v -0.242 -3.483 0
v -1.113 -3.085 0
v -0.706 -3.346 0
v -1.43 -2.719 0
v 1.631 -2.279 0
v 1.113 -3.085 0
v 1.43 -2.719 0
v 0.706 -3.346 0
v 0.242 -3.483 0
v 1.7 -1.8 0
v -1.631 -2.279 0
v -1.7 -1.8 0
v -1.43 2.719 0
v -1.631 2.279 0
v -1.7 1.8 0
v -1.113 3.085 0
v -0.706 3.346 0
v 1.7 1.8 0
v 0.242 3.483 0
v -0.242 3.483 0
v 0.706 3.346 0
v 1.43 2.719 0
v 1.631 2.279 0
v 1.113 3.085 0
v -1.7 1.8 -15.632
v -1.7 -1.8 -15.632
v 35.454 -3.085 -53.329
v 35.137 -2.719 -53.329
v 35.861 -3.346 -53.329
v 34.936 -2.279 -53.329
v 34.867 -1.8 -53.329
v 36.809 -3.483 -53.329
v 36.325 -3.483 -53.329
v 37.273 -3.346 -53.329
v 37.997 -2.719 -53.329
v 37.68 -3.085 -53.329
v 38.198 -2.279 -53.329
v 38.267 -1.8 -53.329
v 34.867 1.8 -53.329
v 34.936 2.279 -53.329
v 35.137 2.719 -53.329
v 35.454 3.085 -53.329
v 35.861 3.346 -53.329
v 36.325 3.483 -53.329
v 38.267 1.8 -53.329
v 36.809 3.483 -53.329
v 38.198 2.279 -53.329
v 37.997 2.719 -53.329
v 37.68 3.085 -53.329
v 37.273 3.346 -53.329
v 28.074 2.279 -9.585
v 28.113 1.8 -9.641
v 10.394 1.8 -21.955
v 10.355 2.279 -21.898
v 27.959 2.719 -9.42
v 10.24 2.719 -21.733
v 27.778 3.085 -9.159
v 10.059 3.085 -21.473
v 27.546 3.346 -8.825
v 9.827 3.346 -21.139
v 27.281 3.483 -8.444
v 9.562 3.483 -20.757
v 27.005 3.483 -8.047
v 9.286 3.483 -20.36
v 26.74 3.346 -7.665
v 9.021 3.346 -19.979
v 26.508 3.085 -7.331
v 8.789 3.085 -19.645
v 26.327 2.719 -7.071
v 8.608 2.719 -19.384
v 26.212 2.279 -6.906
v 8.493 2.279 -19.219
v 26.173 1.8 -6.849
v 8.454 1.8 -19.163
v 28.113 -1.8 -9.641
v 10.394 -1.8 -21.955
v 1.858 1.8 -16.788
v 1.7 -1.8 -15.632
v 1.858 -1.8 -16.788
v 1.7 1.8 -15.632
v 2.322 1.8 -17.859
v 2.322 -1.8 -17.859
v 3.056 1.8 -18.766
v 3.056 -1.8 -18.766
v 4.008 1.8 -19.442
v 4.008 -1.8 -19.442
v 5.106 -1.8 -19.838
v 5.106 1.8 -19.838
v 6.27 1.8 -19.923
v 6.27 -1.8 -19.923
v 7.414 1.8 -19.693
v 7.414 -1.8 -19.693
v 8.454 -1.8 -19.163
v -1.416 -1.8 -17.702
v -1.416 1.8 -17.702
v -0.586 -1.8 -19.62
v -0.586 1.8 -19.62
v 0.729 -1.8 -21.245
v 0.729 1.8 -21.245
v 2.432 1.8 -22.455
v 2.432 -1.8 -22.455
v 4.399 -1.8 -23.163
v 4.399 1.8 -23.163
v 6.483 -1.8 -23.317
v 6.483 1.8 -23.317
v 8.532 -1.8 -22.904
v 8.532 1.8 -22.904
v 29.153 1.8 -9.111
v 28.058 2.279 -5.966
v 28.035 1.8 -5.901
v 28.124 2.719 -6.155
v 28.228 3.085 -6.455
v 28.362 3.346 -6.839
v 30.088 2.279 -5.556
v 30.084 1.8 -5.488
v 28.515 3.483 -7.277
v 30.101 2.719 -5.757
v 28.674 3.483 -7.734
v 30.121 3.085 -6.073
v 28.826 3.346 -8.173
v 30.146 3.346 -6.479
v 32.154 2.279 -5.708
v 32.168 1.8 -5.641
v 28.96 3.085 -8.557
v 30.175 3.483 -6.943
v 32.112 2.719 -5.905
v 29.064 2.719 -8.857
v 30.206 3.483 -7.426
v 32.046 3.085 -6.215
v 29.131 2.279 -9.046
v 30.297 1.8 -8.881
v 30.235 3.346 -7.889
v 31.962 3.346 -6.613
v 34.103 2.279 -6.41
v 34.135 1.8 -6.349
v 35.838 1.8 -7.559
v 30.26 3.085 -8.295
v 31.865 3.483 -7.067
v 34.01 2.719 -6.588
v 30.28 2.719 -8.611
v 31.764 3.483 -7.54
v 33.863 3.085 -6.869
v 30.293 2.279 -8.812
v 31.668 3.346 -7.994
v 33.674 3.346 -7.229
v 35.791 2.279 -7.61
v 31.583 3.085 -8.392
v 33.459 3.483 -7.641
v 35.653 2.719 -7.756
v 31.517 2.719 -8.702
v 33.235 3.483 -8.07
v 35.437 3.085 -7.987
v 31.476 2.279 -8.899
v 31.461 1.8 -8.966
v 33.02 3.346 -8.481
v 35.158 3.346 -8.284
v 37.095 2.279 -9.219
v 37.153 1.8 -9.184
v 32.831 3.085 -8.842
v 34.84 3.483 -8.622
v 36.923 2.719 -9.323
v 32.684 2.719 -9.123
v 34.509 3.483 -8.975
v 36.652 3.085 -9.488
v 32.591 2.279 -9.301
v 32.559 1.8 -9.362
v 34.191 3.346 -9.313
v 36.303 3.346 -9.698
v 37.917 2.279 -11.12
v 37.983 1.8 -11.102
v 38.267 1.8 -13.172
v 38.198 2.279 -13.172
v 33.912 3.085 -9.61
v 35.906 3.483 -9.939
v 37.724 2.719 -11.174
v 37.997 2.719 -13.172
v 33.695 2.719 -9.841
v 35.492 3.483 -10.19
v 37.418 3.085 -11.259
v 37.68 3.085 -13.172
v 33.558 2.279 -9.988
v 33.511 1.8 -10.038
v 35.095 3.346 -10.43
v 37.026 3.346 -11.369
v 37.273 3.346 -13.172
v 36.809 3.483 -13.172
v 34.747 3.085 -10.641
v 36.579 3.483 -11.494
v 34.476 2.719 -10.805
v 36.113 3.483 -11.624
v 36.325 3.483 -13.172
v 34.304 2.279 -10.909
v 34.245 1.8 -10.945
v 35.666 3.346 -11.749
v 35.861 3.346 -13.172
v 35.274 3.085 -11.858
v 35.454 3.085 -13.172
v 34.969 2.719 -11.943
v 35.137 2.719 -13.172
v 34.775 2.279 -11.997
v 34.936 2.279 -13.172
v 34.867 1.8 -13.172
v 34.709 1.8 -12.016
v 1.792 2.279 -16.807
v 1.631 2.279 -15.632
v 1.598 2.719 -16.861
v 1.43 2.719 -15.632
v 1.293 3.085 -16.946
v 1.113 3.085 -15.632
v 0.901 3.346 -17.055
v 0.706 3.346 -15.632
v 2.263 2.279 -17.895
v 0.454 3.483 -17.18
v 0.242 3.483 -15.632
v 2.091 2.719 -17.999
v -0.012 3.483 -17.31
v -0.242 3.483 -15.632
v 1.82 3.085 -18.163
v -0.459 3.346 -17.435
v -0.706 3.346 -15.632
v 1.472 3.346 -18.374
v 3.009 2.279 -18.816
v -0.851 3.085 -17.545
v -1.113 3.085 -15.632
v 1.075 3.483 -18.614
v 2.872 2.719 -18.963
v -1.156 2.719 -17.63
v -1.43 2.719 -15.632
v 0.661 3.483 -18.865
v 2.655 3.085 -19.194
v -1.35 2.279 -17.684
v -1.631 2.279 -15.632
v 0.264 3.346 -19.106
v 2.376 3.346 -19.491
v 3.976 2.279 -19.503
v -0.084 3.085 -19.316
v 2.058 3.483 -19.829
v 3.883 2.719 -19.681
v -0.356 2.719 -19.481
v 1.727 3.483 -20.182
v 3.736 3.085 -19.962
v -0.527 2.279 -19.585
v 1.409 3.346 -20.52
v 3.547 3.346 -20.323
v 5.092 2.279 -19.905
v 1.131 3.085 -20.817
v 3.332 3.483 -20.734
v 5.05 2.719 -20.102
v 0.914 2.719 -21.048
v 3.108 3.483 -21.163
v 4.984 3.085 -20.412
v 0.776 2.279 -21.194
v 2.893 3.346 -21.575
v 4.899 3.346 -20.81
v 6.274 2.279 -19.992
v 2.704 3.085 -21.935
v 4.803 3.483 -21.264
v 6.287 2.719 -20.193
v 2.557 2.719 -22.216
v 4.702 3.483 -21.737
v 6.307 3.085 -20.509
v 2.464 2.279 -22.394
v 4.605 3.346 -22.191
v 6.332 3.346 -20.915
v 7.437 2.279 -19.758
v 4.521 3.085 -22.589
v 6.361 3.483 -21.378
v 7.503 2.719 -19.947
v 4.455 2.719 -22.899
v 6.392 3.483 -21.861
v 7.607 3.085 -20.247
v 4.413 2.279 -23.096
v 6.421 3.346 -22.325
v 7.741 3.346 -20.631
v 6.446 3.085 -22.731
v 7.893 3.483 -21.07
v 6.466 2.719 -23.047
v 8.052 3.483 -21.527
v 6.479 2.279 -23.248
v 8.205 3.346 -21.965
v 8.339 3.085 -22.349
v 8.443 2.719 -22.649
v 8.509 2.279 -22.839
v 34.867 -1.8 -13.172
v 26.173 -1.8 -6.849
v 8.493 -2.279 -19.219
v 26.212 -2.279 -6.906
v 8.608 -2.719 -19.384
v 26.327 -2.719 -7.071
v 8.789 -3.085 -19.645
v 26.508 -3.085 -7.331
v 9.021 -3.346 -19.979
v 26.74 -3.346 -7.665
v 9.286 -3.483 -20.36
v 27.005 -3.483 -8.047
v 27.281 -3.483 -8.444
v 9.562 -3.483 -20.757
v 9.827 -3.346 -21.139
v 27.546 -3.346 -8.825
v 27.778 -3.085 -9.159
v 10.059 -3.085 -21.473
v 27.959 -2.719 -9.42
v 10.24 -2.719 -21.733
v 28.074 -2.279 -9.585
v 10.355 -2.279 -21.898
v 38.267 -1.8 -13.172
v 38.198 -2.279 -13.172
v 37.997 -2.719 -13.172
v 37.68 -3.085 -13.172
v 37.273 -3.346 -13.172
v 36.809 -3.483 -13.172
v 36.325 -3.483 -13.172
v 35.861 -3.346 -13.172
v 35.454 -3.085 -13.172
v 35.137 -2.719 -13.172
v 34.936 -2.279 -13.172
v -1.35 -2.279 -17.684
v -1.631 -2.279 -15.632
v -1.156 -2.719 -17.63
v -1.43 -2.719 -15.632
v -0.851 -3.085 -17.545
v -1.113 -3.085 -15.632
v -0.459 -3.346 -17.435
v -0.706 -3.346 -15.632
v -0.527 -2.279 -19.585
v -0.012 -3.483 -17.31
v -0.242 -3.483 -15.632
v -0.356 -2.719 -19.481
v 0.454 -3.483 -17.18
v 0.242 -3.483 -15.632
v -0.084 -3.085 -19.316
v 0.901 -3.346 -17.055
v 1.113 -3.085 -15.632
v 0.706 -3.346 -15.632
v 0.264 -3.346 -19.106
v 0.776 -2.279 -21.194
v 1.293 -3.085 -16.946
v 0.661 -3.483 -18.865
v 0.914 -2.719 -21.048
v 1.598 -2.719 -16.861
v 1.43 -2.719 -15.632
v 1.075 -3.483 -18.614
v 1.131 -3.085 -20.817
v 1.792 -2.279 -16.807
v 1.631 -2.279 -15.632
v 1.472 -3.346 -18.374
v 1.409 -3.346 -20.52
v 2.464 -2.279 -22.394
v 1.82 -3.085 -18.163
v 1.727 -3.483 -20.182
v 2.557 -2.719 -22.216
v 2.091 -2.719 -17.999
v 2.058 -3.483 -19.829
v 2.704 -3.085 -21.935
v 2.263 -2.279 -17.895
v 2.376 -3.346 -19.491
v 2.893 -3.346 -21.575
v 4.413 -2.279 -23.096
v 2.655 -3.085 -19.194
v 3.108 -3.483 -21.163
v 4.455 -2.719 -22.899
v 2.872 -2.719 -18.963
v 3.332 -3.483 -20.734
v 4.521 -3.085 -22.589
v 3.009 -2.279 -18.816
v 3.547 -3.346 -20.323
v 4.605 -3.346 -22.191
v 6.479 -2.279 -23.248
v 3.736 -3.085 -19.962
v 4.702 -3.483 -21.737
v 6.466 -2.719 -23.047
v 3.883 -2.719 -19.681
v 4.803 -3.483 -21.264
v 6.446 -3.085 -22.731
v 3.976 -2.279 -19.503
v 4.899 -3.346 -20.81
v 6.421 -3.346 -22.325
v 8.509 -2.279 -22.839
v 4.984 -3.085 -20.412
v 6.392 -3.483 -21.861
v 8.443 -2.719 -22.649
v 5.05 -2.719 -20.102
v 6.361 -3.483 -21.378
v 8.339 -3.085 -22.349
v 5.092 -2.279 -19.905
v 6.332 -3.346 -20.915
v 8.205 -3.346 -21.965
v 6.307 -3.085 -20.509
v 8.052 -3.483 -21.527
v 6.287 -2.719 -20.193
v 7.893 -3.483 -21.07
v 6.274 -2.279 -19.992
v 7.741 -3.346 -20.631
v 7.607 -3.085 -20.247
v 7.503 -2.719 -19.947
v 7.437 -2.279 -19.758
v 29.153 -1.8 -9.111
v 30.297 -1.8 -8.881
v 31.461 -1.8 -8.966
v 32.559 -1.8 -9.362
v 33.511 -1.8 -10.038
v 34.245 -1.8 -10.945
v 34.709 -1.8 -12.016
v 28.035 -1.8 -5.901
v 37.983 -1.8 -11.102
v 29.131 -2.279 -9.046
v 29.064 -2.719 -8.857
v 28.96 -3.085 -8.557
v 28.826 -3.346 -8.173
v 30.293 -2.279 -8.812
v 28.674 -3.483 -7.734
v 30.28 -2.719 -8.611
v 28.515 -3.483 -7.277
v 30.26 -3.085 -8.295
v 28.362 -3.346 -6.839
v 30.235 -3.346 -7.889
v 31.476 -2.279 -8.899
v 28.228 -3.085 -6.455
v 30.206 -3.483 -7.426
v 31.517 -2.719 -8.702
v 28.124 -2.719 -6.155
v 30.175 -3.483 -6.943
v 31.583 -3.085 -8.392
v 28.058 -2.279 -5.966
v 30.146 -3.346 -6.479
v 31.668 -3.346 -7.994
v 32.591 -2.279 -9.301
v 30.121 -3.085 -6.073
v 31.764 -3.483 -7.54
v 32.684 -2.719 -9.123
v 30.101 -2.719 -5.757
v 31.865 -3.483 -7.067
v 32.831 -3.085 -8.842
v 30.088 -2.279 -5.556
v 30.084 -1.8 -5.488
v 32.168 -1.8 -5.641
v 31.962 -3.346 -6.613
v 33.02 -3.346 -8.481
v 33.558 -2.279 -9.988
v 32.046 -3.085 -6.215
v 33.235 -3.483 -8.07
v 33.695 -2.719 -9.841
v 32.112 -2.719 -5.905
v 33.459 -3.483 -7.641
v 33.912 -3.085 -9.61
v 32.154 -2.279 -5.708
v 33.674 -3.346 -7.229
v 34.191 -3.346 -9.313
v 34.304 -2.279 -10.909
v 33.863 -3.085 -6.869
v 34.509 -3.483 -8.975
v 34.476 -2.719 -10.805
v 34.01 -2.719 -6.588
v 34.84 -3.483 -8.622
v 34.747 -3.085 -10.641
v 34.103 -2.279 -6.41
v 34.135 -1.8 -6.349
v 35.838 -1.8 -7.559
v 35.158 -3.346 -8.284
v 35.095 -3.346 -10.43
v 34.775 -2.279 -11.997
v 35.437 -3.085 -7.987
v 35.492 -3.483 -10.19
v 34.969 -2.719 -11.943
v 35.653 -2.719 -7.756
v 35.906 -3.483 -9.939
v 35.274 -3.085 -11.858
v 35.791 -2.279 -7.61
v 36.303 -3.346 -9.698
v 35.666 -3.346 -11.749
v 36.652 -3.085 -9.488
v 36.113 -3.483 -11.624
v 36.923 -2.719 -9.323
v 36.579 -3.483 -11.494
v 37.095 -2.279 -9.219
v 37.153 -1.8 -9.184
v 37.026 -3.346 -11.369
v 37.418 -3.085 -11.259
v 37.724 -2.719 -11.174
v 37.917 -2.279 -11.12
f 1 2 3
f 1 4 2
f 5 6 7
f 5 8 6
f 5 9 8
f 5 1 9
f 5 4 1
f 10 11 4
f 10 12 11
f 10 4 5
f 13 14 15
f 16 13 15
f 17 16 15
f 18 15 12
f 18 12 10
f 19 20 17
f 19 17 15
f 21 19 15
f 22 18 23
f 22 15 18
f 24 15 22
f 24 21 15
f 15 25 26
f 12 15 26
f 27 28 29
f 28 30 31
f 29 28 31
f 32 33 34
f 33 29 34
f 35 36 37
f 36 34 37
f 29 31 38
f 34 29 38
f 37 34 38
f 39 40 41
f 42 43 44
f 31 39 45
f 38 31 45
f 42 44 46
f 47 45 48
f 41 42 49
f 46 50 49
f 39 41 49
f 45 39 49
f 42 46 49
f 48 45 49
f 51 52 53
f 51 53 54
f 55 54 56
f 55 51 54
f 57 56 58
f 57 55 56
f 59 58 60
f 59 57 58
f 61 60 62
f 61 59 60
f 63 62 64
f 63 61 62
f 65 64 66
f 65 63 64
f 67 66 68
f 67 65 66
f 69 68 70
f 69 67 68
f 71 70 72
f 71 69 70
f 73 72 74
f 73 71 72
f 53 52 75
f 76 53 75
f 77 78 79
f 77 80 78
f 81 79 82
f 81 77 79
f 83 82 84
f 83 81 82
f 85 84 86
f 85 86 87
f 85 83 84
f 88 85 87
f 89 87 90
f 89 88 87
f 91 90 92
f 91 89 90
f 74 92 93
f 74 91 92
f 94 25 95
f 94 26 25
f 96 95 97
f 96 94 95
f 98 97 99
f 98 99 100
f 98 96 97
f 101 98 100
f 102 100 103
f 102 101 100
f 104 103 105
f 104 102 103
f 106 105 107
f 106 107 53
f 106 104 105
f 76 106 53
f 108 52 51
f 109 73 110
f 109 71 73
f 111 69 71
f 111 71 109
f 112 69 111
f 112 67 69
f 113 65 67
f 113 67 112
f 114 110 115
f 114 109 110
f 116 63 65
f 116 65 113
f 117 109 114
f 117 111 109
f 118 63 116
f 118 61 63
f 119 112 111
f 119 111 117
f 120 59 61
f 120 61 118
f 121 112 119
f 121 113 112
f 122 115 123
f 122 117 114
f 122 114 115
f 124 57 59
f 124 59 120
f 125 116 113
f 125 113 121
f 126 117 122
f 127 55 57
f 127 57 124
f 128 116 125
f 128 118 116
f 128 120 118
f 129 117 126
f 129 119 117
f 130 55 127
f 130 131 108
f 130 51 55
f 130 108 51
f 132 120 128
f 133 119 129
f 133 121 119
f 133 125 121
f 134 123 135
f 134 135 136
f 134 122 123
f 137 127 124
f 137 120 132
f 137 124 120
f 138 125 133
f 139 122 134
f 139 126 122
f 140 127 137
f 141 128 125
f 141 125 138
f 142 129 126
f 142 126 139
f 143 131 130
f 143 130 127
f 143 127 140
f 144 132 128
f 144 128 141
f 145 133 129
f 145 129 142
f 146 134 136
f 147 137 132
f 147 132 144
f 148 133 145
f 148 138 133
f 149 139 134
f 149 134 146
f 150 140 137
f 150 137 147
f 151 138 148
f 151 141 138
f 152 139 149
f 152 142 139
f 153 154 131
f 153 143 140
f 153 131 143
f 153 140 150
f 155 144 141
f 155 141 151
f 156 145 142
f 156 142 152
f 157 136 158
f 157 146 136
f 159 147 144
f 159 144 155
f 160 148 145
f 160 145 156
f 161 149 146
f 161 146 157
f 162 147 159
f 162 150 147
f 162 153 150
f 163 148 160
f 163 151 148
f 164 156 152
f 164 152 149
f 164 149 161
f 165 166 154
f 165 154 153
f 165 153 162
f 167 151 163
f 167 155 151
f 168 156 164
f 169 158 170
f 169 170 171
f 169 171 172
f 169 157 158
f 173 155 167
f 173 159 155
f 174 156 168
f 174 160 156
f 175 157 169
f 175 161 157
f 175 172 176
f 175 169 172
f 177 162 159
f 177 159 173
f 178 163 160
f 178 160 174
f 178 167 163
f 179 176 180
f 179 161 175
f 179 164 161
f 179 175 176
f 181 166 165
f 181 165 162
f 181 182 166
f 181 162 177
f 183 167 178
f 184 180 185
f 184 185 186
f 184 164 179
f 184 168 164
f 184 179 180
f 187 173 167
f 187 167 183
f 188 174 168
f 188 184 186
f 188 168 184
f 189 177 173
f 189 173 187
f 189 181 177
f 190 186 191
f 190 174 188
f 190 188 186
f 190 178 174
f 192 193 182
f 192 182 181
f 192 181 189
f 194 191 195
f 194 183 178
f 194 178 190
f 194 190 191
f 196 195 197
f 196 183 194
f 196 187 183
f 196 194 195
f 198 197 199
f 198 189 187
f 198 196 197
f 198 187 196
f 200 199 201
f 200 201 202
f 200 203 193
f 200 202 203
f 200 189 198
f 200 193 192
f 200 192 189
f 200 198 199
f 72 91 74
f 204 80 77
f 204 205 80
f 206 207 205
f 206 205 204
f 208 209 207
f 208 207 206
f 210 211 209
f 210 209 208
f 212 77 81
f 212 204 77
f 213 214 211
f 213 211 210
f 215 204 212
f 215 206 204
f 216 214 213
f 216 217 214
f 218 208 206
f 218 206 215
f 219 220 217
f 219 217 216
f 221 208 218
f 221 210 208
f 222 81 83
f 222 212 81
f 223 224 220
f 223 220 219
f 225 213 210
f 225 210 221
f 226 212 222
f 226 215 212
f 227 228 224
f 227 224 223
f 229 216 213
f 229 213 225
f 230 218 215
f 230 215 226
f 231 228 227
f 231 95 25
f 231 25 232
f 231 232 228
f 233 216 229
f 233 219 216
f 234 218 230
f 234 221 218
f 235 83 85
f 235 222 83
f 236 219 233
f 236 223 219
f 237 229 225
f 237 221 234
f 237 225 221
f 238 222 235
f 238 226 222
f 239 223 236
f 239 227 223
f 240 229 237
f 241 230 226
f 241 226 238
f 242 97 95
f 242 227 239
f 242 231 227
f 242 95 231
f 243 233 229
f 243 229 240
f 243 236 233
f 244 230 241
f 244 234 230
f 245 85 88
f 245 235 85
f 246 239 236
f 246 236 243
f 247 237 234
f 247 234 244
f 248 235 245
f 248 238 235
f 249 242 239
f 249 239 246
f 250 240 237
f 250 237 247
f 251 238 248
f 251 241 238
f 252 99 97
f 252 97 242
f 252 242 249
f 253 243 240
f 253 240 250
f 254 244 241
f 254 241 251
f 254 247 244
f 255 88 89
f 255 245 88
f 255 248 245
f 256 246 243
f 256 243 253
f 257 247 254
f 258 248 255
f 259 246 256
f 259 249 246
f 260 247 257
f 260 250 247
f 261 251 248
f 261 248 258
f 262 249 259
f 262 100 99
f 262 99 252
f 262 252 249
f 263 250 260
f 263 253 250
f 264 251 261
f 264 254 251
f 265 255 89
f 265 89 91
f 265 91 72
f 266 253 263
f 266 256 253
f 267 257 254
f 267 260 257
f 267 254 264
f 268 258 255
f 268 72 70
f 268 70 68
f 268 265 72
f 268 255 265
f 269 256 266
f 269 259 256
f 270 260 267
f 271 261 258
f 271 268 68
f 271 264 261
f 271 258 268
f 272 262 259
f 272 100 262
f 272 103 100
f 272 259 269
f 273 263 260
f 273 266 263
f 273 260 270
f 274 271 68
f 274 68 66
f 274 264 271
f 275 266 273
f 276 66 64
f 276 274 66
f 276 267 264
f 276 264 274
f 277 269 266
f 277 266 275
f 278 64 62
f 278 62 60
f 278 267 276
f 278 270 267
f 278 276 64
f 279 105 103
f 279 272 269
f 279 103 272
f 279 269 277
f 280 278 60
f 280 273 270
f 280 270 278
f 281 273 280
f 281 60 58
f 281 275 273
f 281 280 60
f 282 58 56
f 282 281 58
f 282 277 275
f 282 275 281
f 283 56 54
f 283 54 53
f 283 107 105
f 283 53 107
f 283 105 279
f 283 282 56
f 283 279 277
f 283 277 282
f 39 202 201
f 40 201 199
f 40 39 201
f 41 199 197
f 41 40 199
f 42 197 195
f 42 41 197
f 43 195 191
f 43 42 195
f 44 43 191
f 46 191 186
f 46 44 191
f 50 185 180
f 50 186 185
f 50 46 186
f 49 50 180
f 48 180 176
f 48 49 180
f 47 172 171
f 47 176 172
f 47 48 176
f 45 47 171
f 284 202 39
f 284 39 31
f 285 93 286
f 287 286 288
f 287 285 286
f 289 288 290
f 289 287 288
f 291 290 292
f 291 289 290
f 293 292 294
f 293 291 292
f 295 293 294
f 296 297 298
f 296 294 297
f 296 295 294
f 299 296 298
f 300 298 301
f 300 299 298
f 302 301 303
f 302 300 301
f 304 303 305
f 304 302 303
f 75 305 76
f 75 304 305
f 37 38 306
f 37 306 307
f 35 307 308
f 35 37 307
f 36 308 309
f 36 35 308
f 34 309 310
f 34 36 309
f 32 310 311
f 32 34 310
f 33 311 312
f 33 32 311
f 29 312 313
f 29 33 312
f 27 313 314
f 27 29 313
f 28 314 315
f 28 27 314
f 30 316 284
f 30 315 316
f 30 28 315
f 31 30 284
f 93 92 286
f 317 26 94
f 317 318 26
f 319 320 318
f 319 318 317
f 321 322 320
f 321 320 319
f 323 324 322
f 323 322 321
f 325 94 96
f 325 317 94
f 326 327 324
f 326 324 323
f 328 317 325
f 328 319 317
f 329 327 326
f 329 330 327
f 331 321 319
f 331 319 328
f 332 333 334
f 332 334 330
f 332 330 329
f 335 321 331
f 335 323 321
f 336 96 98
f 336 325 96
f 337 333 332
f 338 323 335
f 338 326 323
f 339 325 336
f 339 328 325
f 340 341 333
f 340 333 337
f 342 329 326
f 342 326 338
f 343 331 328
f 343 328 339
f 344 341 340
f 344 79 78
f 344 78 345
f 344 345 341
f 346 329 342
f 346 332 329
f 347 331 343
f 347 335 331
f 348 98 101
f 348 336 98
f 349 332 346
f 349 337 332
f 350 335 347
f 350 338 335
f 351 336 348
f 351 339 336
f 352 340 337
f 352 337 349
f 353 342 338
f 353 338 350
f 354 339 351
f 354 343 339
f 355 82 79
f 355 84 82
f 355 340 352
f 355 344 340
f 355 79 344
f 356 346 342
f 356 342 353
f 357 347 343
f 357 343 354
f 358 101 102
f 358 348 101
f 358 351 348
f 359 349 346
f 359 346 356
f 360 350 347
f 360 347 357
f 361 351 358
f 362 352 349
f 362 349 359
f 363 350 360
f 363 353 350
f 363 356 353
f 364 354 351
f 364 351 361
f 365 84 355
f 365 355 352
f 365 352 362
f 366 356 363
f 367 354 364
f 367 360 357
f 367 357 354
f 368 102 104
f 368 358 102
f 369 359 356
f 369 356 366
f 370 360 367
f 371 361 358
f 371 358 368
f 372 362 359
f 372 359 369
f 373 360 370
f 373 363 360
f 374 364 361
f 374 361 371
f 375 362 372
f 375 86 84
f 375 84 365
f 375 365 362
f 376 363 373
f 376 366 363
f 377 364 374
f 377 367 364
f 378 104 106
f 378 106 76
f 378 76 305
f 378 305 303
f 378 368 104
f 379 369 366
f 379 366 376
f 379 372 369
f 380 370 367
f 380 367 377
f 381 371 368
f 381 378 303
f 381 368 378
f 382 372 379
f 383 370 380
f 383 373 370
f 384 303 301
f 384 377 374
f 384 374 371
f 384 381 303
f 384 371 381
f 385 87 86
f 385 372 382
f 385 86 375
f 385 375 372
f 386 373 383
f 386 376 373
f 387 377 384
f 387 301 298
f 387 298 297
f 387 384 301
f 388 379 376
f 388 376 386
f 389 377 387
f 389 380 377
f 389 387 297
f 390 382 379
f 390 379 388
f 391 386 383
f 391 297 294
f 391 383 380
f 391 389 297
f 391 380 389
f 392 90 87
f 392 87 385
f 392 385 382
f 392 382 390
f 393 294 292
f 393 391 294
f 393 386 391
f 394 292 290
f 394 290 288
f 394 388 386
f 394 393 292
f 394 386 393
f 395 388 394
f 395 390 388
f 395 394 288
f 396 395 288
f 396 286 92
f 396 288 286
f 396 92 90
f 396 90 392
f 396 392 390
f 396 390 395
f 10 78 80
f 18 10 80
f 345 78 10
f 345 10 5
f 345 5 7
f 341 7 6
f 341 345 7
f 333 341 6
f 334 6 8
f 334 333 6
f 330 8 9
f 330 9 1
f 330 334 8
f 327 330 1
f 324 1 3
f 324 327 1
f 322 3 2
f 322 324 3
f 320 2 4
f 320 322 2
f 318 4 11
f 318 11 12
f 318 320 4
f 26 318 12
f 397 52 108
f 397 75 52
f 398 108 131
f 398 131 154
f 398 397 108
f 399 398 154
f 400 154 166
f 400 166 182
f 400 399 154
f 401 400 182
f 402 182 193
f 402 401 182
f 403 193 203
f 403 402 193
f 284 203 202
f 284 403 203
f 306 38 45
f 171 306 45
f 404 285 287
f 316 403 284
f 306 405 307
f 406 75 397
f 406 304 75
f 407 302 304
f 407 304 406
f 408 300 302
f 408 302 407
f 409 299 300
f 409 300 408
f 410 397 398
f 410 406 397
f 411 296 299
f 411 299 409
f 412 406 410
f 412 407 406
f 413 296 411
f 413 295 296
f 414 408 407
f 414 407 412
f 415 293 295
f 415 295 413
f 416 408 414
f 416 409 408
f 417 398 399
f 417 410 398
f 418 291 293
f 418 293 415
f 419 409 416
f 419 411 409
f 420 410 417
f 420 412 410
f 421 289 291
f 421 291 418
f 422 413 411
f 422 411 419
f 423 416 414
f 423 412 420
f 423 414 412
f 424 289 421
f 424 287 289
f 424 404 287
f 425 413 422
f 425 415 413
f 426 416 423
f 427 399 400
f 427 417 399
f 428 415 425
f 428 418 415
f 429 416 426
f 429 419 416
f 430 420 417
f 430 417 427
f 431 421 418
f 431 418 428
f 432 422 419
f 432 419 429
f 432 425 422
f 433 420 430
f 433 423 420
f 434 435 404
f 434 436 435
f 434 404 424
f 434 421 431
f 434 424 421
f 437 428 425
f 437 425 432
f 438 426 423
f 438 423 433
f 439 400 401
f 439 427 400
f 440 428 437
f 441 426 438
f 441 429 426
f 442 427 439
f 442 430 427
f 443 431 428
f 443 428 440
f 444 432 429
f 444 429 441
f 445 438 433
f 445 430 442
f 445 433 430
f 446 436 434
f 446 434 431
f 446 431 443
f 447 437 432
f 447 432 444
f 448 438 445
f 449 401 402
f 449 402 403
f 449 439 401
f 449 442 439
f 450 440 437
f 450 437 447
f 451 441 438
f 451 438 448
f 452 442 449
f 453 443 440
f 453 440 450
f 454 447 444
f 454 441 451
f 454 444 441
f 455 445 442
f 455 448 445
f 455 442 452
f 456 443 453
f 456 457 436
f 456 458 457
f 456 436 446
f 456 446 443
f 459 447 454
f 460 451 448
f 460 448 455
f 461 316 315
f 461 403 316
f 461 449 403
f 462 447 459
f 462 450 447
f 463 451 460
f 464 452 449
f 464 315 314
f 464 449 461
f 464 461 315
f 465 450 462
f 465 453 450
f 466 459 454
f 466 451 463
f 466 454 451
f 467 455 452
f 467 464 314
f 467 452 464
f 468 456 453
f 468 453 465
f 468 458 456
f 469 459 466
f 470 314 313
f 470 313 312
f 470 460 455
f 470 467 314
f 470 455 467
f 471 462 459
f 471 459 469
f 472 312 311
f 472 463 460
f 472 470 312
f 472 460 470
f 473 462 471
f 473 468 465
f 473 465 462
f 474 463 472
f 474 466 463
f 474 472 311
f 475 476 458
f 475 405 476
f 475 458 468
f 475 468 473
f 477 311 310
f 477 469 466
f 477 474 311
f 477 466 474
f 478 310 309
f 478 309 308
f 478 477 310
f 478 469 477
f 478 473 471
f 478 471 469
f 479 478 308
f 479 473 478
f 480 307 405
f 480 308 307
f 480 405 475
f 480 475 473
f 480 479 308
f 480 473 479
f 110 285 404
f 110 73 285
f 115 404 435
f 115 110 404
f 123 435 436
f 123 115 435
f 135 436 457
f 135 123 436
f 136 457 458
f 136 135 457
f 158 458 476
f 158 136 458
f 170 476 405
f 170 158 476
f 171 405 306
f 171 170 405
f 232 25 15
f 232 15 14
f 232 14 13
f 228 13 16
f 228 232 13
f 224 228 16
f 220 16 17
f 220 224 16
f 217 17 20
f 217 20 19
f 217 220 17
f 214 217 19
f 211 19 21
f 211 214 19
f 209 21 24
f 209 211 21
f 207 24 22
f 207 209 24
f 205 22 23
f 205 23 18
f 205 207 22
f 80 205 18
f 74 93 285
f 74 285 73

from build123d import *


with BuildPart() as part:
    # Sweep1: sweep along a path in Sketch2
    with BuildLine(Plane(origin=(0, 0, 0), x_dir=(1, 0, 0), z_dir=(0, 1, 0))) as sweep1_path:
        Line((0, 0), (0, 15.631722518))
        ThreePointArc((0, 15.631722518), (3.220069275, 20.948863212), (9.423995054, 20.55881678))
        Line((9.423995054, 20.55881678), (27.143102002, 8.245243845))
        ThreePointArc((27.143102002, 8.245243845), (33.347027781, 7.855197413), (36.567097056, 13.172338107))
        Line((36.567097056, 13.172338107), (36.567097056, 53.328590127))
    # Sketch1 → Sweep1 (sweep)
    with BuildSketch(Plane.XY):
        with BuildLine():
            Line((-1.7, -1.8), (-1.7, 1.8))
            ThreePointArc((-1.7, 1.8), (0, 3.5), (1.7, 1.8))
            Line((1.7, 1.8), (1.7, -1.8))
            ThreePointArc((1.7, -1.8), (0, -3.5), (-1.7, -1.8))
        make_face()
    sweep(path=sweep1_path.line)


solid = part.part
